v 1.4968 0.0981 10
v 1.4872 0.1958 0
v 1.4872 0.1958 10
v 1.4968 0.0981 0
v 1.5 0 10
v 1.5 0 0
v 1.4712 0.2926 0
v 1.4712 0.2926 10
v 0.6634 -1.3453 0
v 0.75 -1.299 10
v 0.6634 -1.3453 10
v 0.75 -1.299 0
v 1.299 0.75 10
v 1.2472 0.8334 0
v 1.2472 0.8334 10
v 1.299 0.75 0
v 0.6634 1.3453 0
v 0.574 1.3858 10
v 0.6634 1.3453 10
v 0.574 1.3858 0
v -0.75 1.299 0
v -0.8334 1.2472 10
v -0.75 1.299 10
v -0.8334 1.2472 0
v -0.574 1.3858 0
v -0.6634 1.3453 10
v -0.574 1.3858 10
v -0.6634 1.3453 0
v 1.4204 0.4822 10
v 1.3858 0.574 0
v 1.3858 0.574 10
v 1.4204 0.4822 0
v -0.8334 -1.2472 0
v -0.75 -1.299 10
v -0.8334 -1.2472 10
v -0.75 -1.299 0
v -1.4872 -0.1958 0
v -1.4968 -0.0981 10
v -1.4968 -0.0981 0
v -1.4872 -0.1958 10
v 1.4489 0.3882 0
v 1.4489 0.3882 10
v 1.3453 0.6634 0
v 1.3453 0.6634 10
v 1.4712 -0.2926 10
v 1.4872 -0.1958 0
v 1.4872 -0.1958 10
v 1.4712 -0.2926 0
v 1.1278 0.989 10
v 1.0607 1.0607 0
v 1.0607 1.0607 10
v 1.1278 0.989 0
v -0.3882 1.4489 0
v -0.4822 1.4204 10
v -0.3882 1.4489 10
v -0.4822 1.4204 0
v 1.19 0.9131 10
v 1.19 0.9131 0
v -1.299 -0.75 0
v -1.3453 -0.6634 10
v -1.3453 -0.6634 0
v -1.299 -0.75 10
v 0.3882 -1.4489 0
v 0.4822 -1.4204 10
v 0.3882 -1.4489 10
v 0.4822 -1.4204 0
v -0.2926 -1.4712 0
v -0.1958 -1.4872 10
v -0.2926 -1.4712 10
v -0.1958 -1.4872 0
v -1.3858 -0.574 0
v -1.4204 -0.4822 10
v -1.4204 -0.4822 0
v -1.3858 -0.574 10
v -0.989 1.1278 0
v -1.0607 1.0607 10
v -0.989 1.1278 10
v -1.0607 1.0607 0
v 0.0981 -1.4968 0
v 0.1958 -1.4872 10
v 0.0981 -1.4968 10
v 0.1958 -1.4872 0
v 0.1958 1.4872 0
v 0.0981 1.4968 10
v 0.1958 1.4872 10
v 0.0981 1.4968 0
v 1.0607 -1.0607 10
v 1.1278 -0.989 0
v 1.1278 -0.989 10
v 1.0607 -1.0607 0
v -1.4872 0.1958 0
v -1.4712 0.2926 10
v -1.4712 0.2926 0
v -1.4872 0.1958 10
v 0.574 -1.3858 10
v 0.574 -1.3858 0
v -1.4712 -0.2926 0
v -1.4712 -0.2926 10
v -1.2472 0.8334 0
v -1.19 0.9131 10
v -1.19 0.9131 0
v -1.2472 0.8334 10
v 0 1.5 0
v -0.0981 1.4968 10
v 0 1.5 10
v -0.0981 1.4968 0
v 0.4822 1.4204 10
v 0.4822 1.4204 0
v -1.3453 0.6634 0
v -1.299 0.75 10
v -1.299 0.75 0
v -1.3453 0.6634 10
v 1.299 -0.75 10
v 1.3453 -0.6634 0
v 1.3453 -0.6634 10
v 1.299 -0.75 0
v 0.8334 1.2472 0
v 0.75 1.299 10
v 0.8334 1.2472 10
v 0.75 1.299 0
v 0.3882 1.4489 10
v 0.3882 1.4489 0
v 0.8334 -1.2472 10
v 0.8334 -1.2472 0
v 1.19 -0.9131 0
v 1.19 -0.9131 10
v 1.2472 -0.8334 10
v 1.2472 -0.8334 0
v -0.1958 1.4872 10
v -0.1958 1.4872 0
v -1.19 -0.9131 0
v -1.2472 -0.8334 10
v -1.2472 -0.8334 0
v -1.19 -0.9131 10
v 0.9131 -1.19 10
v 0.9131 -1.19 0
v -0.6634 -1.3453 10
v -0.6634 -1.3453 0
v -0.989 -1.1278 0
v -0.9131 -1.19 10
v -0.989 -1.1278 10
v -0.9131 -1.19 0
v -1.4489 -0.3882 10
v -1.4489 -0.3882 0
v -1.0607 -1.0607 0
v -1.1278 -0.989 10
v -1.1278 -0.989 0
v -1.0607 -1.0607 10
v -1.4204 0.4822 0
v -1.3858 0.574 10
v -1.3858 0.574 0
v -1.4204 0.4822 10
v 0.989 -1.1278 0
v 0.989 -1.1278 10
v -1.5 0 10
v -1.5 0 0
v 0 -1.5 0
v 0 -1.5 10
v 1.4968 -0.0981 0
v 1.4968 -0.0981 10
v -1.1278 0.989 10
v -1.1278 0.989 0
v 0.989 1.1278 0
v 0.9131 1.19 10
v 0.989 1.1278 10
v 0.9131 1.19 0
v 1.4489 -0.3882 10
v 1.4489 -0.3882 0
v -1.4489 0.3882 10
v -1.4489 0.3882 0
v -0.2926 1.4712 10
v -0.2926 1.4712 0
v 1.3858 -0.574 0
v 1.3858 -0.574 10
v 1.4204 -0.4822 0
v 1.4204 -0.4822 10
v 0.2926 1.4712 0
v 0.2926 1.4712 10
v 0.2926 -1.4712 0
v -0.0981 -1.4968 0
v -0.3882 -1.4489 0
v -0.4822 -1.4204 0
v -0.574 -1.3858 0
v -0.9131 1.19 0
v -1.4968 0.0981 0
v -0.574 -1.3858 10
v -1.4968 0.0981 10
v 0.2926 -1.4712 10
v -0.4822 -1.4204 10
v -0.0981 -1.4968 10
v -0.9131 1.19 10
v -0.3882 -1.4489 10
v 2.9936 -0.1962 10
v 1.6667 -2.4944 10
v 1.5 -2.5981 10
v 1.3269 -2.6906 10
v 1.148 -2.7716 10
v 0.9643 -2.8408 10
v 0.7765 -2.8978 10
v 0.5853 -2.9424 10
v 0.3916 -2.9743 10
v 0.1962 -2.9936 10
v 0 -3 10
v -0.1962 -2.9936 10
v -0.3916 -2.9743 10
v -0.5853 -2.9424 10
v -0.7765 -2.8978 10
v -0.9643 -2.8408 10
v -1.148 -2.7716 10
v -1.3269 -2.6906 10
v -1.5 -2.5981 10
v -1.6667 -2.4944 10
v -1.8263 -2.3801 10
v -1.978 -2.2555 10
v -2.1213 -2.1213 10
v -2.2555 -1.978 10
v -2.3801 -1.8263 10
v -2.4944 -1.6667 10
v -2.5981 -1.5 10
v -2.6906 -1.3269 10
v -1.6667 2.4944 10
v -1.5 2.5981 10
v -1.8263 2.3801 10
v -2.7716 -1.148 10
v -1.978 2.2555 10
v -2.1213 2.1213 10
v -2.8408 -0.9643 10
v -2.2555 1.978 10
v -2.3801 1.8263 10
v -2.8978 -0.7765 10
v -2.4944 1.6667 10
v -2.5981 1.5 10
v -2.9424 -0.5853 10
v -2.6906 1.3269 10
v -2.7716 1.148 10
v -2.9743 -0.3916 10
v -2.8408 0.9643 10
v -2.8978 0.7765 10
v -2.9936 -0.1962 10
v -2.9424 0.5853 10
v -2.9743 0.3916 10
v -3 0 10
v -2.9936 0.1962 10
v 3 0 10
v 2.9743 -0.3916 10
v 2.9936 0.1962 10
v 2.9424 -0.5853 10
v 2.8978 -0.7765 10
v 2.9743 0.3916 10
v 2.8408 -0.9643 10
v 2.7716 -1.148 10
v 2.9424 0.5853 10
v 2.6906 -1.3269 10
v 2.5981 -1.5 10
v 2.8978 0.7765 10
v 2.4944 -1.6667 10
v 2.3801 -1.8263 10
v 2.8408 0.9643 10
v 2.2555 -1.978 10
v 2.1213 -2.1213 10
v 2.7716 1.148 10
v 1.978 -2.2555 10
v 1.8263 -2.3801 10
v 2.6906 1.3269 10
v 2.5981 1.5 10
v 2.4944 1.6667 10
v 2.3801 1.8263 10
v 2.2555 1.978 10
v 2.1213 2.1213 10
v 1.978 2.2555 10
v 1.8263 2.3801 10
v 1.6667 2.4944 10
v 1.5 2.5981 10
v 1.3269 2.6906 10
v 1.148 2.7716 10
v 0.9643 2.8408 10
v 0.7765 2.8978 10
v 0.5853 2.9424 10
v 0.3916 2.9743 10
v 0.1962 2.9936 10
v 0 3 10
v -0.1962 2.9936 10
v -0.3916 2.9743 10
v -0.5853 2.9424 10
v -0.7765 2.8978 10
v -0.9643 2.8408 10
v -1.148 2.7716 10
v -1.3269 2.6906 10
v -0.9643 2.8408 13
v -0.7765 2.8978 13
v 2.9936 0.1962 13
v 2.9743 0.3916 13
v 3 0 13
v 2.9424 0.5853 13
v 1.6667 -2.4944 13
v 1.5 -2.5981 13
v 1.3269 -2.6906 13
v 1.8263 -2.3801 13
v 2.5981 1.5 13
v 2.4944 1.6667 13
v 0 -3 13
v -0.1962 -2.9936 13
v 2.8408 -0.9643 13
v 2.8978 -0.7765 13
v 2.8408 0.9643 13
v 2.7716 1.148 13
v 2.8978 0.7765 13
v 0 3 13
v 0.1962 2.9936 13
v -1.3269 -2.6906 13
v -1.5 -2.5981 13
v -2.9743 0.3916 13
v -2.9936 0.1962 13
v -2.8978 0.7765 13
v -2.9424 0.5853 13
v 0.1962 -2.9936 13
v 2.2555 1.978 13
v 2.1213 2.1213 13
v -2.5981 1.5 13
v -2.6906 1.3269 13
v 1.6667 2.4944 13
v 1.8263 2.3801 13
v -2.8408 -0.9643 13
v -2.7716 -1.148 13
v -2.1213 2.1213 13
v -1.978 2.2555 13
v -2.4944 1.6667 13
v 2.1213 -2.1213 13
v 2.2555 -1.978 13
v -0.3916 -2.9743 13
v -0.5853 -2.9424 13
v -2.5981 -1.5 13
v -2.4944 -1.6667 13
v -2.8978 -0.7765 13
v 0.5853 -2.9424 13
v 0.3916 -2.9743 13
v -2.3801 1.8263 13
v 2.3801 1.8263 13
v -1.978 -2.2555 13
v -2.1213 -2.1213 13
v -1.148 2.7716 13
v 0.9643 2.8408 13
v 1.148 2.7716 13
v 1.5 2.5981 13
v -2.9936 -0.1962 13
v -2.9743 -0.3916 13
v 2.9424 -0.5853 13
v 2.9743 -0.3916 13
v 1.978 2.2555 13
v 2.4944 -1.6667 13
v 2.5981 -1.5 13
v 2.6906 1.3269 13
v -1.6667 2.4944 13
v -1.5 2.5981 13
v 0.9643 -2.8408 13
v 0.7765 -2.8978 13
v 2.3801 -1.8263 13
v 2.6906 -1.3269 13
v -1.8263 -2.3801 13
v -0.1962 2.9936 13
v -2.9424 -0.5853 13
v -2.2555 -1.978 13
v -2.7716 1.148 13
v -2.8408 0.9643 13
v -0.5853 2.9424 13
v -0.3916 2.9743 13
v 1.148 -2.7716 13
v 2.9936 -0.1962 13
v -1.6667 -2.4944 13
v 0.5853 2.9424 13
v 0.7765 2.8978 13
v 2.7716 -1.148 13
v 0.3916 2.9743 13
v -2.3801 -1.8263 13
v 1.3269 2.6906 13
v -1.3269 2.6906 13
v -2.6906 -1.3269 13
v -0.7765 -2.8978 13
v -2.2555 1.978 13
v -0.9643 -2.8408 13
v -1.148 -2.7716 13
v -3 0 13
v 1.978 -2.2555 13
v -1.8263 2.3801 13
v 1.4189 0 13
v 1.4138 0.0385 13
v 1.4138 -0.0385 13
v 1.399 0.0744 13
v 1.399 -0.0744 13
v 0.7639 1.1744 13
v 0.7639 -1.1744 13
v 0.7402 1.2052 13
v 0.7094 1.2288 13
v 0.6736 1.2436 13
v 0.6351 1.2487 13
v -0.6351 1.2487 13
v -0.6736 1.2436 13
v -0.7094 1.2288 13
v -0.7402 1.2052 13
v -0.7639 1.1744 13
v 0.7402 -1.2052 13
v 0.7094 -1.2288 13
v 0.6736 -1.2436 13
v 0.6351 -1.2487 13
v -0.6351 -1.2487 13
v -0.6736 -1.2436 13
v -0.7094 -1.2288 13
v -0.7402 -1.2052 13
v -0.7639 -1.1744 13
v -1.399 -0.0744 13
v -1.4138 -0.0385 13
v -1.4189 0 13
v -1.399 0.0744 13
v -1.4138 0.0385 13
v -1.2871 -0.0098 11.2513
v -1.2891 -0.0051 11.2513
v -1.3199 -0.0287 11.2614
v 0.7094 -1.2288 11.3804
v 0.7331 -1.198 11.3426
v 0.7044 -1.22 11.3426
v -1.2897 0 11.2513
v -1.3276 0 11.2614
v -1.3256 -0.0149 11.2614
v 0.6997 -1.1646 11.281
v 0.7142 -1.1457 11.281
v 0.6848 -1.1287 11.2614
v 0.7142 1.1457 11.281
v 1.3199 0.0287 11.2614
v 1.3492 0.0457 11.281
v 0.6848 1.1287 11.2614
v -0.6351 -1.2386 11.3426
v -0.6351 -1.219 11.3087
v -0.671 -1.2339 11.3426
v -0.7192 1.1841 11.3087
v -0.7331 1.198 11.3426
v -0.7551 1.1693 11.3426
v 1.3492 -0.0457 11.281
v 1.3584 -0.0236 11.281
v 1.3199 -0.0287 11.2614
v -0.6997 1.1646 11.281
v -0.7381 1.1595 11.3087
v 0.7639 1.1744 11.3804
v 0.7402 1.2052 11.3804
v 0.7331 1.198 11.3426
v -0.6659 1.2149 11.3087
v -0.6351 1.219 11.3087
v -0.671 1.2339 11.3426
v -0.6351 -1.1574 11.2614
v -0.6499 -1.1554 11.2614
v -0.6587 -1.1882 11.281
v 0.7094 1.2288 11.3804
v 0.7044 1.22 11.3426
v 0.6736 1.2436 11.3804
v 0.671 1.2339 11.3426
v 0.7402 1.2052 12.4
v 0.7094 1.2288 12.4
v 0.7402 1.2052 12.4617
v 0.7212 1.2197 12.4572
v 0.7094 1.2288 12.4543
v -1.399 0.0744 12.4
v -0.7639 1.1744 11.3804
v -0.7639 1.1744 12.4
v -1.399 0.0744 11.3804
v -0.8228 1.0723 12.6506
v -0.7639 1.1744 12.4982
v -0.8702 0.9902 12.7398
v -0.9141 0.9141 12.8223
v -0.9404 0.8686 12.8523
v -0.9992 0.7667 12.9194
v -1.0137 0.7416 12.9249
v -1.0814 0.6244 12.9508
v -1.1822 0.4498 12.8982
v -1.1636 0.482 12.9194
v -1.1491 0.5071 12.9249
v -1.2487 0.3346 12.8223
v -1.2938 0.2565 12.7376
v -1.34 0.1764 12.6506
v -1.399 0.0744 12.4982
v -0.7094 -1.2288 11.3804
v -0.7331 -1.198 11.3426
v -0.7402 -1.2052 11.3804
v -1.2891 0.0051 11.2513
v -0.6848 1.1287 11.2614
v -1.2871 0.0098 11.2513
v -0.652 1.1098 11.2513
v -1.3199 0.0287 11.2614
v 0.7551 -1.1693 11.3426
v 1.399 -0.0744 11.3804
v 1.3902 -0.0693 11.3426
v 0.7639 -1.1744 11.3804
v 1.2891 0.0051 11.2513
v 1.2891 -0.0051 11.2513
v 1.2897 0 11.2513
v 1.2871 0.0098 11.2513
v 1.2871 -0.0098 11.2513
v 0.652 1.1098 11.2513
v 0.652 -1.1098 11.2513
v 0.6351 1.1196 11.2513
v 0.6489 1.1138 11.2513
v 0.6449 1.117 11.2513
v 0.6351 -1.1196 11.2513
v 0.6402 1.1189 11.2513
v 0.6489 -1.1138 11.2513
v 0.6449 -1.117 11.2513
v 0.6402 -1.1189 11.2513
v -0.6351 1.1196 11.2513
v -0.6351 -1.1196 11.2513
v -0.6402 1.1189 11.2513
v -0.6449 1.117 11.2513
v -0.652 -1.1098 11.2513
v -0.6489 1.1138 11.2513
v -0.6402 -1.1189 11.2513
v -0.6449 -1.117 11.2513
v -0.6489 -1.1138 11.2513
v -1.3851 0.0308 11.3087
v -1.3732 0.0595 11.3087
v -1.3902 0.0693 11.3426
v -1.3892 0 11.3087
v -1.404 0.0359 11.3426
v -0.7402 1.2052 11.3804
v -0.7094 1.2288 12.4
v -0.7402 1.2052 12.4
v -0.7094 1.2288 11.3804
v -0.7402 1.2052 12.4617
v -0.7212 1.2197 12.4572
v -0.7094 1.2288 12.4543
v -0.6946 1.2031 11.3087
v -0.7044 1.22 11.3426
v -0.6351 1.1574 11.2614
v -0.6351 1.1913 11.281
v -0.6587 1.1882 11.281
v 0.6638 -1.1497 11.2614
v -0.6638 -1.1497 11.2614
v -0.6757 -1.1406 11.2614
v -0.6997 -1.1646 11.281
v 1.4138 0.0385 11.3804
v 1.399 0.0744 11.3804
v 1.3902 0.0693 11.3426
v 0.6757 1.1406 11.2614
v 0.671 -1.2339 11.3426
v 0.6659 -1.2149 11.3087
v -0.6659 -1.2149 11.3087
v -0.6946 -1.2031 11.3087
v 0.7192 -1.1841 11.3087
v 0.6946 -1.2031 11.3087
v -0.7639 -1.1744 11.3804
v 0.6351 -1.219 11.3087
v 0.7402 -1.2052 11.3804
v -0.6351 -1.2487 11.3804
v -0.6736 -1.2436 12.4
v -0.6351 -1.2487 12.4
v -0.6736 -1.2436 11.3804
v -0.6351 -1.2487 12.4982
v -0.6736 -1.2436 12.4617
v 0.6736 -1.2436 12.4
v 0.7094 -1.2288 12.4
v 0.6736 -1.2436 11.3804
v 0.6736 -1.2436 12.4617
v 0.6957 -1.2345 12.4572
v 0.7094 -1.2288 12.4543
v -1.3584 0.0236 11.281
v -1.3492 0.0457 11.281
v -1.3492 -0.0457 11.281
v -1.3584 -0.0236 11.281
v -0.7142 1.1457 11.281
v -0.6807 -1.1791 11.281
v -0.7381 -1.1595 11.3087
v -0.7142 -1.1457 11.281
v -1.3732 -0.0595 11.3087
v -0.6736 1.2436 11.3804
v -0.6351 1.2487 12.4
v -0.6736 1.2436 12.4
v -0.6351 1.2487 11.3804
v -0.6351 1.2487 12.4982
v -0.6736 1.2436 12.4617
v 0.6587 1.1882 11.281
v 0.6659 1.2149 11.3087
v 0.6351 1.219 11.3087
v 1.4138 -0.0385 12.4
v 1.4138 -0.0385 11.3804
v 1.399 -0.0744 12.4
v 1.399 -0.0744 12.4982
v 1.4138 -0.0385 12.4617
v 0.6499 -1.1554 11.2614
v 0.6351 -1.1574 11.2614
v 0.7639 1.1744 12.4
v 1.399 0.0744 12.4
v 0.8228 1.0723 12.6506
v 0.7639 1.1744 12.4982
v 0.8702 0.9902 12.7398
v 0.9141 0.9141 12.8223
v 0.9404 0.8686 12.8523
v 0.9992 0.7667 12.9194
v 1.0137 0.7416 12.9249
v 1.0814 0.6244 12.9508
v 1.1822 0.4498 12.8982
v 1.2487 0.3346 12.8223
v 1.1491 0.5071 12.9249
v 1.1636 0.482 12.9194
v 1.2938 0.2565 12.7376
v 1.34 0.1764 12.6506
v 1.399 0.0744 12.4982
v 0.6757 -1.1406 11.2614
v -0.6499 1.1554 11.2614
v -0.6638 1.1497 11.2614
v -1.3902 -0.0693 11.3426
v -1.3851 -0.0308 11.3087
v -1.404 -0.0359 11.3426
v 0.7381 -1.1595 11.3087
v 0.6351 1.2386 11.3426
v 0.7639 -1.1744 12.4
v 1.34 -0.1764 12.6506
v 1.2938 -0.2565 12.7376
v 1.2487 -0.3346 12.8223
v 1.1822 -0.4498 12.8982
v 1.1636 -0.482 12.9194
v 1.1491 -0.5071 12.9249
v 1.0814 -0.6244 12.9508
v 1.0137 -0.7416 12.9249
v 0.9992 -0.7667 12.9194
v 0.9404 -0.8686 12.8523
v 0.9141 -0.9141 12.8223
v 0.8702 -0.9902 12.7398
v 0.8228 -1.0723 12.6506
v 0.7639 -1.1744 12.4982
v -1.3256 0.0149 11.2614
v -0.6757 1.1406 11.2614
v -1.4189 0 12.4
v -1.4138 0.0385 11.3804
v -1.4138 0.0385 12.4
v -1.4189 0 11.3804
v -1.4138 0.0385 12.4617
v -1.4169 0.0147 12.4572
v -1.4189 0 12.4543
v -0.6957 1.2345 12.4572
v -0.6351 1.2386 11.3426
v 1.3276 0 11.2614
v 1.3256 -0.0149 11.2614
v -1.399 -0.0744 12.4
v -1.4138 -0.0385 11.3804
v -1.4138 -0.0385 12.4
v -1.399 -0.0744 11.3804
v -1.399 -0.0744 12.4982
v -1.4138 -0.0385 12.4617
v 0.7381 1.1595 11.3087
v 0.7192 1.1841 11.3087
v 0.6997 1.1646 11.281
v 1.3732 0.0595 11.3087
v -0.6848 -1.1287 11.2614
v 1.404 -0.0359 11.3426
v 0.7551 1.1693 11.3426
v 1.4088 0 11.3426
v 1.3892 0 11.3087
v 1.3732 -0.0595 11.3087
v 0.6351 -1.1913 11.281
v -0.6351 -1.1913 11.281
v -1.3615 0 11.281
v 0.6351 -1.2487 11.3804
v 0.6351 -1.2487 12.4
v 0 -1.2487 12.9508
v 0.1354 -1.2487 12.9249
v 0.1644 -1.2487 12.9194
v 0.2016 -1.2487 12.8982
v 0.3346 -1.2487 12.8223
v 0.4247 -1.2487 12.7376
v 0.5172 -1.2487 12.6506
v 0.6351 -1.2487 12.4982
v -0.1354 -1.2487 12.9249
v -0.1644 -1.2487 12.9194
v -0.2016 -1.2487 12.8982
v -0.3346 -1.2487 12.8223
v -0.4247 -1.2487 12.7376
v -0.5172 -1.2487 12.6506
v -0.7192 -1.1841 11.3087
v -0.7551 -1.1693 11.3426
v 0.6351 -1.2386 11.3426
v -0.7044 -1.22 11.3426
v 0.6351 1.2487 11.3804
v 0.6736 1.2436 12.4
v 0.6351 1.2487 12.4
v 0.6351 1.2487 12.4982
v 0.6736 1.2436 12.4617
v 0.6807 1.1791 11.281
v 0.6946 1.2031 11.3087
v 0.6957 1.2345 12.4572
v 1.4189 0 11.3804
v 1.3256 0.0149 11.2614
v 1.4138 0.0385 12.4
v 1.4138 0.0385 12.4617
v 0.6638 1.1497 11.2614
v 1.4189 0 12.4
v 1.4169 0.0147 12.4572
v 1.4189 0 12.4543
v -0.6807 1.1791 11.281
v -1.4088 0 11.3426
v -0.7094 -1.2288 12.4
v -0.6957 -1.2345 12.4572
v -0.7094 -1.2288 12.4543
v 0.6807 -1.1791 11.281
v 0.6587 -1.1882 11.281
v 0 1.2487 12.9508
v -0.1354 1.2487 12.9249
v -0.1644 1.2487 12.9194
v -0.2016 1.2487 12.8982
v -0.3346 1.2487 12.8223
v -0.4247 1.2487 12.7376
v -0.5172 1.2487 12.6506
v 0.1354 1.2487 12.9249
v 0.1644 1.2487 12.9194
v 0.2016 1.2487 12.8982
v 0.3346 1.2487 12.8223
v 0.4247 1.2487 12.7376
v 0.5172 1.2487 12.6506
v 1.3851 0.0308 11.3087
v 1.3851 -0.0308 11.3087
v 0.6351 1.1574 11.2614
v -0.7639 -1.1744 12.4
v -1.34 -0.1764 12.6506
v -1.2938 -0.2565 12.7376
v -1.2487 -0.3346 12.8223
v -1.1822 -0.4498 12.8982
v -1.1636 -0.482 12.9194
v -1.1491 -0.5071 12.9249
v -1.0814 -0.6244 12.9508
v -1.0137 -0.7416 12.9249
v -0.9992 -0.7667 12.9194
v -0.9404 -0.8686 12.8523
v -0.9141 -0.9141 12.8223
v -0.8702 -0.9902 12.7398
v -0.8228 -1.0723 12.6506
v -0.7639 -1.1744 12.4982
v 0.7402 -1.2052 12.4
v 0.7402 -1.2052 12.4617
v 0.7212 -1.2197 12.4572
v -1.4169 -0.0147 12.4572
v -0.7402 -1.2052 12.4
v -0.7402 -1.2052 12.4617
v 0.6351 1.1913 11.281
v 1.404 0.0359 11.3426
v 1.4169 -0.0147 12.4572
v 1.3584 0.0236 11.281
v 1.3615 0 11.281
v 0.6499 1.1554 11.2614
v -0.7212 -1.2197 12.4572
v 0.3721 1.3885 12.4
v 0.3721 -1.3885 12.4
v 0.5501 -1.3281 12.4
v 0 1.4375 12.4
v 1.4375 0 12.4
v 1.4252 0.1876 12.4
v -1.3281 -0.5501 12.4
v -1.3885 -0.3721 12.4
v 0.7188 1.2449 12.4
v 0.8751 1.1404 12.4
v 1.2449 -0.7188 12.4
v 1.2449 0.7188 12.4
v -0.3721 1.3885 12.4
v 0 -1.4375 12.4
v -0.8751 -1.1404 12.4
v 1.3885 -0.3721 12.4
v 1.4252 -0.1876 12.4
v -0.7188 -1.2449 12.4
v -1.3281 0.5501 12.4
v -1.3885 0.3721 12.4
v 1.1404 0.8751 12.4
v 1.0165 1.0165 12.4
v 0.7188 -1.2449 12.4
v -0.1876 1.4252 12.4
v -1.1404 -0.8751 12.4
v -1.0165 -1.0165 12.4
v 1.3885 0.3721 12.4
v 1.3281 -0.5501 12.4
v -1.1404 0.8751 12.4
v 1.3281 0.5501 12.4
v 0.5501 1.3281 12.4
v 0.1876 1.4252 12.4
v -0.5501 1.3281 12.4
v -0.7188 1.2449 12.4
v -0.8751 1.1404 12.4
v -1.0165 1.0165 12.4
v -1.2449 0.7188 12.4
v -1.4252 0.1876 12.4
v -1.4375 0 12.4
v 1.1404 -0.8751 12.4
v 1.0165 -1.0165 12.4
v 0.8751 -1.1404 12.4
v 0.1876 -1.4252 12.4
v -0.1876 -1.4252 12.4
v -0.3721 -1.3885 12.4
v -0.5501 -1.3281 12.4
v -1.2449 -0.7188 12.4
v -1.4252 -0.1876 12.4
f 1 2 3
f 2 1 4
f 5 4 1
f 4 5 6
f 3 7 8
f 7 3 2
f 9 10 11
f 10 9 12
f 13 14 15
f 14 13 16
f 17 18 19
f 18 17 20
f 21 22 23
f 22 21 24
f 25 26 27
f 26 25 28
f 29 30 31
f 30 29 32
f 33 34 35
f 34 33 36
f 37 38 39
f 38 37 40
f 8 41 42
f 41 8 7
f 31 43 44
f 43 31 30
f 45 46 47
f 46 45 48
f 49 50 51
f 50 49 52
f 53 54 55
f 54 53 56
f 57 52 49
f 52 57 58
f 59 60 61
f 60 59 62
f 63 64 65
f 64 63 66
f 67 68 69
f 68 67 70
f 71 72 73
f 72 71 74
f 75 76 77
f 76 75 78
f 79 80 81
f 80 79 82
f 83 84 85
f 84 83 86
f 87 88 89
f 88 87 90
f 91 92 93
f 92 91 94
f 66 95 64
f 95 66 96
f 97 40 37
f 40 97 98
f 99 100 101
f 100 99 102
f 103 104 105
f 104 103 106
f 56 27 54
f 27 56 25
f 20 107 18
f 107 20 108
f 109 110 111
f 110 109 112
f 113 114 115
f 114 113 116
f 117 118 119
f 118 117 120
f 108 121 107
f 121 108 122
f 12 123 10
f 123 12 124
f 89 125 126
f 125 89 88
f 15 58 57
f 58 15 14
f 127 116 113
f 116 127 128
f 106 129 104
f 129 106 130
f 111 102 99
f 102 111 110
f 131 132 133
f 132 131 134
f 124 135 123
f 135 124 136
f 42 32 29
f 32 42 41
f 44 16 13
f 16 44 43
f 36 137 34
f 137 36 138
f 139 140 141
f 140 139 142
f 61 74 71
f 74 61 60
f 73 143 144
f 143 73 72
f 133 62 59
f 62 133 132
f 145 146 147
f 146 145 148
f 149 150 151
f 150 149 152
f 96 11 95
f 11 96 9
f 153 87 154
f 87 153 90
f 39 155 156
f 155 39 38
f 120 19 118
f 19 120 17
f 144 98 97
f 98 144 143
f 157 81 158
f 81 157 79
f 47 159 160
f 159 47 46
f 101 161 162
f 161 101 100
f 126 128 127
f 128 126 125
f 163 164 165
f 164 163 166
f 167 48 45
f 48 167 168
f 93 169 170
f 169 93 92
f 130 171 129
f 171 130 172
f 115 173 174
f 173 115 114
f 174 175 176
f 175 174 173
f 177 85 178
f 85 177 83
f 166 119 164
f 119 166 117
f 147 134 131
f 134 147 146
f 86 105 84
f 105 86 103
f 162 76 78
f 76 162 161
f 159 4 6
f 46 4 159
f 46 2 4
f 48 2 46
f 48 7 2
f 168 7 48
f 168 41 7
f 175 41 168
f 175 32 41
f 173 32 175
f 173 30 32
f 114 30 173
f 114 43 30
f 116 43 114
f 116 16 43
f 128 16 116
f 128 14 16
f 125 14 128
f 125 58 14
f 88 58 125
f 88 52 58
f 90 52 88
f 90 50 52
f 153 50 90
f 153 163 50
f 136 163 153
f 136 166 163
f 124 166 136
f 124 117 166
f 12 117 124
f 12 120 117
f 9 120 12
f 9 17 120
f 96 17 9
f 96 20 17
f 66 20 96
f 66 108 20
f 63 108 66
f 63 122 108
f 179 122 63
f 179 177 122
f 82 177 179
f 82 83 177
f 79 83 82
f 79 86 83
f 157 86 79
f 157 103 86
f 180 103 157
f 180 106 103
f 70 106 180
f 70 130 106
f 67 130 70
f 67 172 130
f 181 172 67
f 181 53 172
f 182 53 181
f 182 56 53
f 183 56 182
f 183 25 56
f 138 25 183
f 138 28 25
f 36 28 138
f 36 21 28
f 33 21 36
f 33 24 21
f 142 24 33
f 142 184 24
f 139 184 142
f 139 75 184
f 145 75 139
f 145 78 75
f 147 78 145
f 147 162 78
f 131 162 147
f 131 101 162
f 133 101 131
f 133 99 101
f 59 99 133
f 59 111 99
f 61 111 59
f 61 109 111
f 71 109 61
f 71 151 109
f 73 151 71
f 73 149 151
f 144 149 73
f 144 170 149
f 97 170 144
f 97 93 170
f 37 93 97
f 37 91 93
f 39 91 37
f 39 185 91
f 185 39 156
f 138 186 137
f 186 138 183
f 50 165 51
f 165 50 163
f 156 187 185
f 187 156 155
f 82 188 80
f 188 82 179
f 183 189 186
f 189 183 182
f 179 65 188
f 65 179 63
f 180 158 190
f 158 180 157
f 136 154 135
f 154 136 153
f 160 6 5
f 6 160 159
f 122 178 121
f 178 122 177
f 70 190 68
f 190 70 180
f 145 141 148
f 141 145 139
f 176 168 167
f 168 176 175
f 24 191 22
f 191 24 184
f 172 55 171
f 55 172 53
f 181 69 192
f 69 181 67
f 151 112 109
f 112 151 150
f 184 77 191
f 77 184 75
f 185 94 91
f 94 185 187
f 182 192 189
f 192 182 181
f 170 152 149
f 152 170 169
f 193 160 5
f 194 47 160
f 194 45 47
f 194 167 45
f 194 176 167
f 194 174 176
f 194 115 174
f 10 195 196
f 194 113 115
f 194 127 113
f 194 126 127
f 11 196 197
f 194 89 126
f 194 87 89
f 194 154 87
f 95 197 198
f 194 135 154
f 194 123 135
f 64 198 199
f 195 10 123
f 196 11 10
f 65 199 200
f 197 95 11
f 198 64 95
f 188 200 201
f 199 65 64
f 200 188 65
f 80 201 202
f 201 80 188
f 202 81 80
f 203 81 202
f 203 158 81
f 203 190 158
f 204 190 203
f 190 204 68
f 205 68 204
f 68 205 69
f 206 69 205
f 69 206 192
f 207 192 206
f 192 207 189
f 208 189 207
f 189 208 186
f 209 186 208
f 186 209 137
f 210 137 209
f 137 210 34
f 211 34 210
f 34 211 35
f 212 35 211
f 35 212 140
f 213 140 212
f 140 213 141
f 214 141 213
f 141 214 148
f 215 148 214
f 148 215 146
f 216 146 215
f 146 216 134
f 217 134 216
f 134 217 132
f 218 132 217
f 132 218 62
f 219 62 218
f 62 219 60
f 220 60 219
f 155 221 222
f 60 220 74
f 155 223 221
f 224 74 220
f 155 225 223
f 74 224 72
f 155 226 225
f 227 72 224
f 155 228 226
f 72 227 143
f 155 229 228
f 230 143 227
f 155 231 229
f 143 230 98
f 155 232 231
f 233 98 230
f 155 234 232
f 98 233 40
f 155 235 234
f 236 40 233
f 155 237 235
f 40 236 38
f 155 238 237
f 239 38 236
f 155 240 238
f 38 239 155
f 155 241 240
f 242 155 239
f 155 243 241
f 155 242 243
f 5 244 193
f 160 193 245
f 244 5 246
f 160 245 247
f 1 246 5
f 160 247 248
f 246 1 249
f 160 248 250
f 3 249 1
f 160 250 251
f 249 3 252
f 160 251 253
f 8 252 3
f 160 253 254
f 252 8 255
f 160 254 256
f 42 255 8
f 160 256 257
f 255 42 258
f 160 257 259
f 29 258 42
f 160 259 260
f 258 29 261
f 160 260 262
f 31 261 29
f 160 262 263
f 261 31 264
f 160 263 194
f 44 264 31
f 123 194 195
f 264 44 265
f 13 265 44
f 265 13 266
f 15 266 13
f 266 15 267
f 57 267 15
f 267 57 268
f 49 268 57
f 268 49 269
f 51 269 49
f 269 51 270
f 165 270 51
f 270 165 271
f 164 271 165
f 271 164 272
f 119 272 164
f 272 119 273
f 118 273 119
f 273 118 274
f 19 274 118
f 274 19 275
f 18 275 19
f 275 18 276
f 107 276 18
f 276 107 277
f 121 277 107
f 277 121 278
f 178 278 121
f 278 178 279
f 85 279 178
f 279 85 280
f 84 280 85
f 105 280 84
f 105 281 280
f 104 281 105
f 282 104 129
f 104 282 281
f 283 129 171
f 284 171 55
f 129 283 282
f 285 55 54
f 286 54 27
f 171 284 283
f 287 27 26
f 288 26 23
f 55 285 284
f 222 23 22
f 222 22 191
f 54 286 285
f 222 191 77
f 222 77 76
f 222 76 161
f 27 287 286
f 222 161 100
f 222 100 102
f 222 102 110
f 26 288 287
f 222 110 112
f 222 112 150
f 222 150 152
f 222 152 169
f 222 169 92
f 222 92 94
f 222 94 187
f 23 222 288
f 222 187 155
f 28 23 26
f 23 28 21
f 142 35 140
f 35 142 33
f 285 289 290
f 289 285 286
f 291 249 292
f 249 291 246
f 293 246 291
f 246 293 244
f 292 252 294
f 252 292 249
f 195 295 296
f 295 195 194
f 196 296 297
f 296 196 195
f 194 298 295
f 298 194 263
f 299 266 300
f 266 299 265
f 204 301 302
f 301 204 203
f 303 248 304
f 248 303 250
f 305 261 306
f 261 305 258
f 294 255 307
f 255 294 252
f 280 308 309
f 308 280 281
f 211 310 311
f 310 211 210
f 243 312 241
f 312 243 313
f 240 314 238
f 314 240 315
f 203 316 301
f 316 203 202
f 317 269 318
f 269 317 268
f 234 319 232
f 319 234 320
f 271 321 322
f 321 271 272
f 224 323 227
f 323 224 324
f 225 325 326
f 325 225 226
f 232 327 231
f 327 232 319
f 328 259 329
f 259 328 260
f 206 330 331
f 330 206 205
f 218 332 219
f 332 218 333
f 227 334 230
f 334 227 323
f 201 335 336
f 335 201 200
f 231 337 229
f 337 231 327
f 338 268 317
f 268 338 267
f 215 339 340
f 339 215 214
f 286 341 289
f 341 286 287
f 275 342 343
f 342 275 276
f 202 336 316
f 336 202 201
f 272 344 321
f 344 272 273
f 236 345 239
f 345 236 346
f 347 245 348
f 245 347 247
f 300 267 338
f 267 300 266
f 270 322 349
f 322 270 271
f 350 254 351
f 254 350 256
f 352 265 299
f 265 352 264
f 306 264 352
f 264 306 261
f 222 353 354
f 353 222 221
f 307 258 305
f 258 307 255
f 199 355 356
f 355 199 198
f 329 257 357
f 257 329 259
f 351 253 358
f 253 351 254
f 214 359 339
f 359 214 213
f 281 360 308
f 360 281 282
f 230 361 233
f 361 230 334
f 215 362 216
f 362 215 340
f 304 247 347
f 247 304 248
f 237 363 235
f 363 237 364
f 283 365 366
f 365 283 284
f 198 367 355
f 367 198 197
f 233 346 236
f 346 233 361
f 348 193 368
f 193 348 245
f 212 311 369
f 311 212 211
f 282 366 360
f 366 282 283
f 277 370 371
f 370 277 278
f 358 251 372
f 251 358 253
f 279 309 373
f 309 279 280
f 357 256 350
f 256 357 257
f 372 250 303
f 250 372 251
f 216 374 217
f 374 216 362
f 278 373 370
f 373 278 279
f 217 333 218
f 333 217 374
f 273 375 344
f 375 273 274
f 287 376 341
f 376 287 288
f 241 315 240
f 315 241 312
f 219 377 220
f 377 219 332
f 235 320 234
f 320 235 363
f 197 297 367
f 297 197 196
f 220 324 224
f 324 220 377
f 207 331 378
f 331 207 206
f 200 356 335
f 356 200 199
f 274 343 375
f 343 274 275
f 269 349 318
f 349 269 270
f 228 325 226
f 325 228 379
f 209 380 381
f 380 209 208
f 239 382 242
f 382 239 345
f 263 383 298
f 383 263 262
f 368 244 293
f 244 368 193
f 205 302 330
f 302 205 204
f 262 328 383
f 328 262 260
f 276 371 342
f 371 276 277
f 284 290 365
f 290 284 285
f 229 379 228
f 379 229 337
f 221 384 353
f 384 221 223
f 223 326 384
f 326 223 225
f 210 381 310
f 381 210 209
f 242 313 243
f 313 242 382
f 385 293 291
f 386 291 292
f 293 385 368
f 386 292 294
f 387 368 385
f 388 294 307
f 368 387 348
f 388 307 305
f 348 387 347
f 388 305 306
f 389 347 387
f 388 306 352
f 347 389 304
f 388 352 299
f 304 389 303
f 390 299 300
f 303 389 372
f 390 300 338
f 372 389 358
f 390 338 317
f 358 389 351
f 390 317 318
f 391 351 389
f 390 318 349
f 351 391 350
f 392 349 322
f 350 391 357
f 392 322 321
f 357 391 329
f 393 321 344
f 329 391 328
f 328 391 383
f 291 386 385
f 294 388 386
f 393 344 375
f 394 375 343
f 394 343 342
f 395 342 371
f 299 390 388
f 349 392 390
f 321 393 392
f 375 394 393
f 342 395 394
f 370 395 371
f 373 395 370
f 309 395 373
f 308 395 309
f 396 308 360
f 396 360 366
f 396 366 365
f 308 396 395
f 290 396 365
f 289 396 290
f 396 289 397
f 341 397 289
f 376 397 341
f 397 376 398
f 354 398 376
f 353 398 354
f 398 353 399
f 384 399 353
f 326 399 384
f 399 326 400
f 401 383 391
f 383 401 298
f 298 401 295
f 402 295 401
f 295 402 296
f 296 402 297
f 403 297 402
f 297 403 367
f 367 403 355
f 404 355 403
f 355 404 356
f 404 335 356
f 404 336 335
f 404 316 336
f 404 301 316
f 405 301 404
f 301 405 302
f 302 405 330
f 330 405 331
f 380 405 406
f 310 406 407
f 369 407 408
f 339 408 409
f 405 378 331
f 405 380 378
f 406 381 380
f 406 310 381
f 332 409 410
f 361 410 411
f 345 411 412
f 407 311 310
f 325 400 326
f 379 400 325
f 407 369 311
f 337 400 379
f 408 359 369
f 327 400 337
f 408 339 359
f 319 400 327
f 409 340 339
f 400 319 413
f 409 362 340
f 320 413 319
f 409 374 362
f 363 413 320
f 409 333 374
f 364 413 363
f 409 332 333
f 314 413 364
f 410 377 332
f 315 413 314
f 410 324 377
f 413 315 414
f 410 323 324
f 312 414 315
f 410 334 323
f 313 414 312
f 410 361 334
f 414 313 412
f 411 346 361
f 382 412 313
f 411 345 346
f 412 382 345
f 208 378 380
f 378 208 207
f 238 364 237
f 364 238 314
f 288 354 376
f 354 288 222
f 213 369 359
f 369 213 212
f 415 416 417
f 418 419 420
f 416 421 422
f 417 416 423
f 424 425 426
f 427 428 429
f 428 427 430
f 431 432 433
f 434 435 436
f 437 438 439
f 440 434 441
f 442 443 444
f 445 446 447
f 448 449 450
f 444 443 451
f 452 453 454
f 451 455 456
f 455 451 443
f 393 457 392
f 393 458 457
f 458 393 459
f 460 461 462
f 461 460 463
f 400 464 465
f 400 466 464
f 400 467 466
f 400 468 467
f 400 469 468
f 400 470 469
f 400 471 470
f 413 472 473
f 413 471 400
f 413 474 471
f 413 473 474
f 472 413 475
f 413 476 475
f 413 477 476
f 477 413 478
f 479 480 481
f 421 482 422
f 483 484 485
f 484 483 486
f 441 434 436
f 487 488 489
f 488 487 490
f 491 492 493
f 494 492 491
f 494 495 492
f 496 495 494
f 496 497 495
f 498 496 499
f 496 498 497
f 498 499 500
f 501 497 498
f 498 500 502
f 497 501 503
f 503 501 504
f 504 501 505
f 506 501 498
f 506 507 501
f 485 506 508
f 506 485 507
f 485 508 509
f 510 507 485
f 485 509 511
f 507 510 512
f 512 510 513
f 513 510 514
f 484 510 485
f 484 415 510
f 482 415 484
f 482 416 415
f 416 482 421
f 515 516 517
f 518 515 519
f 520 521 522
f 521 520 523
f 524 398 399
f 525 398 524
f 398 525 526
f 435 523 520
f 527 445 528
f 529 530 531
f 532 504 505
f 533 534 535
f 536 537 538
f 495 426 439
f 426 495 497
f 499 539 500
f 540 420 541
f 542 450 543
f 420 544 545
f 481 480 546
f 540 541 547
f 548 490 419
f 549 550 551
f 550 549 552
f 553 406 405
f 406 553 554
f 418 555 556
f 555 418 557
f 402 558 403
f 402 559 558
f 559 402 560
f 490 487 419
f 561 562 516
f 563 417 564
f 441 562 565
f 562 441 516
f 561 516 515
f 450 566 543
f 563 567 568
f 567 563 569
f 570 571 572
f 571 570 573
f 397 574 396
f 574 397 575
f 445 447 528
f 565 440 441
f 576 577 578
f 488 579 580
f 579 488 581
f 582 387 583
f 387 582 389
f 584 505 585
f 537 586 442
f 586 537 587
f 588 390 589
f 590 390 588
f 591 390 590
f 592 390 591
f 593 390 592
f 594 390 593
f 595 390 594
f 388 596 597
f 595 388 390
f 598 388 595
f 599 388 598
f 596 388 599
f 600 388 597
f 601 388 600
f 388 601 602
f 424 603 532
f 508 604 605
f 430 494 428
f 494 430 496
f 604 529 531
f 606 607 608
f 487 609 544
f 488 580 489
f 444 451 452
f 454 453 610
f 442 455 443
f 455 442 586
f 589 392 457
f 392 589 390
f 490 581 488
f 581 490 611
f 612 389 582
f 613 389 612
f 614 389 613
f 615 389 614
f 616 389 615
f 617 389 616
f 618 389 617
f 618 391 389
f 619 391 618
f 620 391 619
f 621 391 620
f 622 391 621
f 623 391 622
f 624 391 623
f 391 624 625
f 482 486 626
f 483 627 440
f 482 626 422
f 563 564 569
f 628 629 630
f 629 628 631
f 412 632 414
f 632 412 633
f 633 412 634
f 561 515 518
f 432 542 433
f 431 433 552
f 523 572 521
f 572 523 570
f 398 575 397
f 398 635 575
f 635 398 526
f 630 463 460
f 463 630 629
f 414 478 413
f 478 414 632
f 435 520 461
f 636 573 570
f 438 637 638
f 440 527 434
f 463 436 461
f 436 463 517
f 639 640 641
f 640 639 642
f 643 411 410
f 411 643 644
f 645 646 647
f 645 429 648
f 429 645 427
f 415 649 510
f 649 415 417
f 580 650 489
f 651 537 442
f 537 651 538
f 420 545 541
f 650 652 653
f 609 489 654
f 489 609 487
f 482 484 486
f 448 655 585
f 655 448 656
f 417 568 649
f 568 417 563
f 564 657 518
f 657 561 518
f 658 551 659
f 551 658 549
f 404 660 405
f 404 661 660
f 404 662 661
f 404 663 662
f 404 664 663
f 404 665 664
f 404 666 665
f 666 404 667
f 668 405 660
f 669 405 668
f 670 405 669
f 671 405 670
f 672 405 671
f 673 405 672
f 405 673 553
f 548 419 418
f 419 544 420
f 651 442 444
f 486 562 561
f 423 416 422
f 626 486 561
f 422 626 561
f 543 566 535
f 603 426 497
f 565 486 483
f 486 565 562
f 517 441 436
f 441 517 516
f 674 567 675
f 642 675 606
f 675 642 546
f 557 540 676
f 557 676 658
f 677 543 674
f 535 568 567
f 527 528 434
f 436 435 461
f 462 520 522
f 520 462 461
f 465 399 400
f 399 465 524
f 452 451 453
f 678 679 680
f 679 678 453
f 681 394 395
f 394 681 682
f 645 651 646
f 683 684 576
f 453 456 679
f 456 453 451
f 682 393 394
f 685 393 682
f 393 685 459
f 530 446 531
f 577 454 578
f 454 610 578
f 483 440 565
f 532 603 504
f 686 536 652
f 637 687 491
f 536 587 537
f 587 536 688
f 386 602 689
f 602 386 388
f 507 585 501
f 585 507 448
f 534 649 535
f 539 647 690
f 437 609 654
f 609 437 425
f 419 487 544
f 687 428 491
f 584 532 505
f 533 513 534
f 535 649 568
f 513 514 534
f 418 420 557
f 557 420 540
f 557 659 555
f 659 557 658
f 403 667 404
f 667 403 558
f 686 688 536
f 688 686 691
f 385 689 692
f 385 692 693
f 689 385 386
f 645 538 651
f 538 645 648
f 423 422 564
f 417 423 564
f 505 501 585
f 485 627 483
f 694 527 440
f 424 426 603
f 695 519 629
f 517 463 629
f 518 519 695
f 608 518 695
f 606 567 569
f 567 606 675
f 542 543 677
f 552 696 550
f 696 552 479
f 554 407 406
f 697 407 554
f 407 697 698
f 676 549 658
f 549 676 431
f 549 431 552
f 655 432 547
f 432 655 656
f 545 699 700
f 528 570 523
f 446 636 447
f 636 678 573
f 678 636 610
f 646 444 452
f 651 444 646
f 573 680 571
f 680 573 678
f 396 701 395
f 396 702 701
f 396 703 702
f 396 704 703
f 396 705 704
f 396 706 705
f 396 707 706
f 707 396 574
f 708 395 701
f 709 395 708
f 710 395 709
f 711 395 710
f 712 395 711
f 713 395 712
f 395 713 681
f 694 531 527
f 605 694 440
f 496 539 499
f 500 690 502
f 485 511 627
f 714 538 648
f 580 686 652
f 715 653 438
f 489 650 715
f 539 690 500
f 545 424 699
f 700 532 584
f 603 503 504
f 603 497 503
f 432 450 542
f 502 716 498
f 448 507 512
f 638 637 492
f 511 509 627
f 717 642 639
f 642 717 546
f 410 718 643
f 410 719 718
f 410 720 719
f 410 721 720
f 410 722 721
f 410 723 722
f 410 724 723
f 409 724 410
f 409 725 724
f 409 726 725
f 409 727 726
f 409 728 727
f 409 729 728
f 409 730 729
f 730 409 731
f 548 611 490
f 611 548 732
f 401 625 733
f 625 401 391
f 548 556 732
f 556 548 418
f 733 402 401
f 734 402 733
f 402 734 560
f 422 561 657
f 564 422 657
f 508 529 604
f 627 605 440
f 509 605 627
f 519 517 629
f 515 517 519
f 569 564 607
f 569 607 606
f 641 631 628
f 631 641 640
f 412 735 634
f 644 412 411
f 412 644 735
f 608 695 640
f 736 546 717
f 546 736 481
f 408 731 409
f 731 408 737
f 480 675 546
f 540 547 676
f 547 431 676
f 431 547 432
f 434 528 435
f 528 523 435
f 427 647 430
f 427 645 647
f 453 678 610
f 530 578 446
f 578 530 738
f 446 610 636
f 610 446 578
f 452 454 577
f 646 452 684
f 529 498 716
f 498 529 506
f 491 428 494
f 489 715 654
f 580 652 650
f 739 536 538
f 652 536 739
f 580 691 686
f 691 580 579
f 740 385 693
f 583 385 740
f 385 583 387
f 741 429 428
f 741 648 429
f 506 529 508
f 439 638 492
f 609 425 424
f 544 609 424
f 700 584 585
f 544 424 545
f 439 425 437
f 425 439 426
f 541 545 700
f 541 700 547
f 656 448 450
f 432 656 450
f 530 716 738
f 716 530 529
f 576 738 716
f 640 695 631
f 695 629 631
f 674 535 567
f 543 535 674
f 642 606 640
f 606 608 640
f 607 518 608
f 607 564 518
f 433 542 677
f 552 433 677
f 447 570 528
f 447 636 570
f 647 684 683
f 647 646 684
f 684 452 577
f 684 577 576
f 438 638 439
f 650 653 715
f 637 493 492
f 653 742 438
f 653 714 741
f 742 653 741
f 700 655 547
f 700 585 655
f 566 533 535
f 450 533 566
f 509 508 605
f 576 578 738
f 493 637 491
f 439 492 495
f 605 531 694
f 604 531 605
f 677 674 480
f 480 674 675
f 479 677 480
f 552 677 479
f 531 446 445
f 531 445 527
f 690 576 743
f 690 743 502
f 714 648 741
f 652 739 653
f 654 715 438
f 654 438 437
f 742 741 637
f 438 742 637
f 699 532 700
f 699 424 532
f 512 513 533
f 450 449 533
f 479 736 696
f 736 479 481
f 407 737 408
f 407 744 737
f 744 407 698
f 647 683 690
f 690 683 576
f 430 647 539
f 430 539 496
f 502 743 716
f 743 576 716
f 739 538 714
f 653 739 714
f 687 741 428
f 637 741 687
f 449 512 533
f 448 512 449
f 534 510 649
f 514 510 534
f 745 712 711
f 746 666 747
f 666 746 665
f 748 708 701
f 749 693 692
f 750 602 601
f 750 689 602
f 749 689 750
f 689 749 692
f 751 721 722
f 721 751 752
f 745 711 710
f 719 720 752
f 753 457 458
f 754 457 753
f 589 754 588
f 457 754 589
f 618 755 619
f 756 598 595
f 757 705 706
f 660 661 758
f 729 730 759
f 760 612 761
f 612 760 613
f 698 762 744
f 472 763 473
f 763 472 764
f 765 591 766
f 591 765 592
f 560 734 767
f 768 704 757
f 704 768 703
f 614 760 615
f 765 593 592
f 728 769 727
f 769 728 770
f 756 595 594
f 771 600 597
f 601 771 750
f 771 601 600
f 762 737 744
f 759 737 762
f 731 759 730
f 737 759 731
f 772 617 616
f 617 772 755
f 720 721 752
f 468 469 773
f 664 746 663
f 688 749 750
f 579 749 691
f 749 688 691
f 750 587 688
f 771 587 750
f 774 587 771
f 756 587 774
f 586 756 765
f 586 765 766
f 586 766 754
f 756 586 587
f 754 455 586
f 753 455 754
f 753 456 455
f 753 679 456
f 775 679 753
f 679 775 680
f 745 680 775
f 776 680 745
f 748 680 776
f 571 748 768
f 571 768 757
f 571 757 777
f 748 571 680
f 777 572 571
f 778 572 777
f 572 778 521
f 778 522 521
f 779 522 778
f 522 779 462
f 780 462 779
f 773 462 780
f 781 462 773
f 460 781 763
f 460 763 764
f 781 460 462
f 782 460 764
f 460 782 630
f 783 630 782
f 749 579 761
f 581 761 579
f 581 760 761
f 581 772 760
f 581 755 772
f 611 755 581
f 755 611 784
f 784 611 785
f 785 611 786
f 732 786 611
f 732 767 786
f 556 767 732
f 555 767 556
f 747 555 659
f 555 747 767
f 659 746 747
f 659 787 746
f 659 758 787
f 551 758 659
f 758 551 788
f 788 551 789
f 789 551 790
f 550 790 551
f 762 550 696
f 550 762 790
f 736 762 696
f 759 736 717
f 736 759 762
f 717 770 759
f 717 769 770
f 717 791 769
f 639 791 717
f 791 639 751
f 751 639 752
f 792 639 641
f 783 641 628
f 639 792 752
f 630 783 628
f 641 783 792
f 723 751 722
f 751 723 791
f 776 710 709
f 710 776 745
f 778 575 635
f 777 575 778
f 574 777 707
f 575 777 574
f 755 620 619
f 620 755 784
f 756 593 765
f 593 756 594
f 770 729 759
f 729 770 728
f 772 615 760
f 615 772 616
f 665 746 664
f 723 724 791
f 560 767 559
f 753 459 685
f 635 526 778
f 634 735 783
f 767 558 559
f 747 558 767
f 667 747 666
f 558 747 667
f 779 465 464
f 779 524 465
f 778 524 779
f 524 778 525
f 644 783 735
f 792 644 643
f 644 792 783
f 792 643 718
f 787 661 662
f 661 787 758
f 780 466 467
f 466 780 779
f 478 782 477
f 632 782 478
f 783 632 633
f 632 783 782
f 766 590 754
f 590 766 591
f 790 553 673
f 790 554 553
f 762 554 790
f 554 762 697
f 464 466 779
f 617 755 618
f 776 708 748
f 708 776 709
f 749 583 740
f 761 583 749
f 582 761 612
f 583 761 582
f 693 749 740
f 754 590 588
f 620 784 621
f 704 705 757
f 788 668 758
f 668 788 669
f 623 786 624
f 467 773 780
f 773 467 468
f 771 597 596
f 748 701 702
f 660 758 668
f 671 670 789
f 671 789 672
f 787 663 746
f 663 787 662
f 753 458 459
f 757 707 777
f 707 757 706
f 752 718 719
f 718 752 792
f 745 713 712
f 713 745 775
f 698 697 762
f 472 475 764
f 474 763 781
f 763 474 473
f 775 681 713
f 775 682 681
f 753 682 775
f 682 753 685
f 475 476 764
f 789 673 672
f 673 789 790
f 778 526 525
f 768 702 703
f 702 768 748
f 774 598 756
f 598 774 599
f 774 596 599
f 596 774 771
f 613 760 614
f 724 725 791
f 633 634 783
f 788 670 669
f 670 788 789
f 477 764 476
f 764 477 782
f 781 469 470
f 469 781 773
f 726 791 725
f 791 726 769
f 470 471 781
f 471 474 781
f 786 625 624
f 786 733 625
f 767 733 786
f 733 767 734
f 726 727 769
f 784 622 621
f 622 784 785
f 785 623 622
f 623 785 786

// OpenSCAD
$fn = 96;

// Socket Head Cap Screw (approx. ISO 4762)
// Parameters (mm)
d_shank = 3.0;
L = 10.0;

d_head = 6.0;
h_head = 3.0;

hex_af = 2.5;          // typical for M3
hex_depth = 1.6;       // typical for M3
hex_corner_r = 0.15;   // slight rounding

// Small edge chamfers
head_top_chamfer = 0.35;
head_bottom_chamfer = 0.25;
shank_tip_chamfer = 0.25;

module hex_prism(af, h) {
    // Regular hex with across-flats = af
    r = af / sqrt(3); // circumradius
    cylinder(h=h, r=r, $fn=6);
}

module socket_head_cap_screw() {
    union() {
        // Shank
        translate([0,0,0])
        cylinder(h=L, d=d_shank);

        // Shank tip chamfer
        translate([0,0,0])
        cylinder(h=shank_tip_chamfer, d1=d_shank*0.6, d2=d_shank);

        // Head (with slight bottom chamfer)
        translate([0,0,L])
        cylinder(h=h_head, d=d_head);

        // Bottom chamfer on head
        translate([0,0,L])
        cylinder(h=head_bottom_chamfer, d1=d_head*0.92, d2=d_head);

        // Top chamfer on head
        translate([0,0,L + h_head - head_top_chamfer])
        cylinder(h=head_top_chamfer, d1=d_head, d2=d_head*0.92);
    }
}

module screw_with_socket() {
    difference() {
        socket_head_cap_screw();

        // Hex socket cut
        translate([0,0, L + h_head - hex_depth])
        minkowski() {
            hex_prism(hex_af - 2*hex_corner_r, hex_depth + 0.02);
            sphere(r=hex_corner_r, $fn=24);
        }

        // Slight lead-in at socket opening
        translate([0,0, L + h_head - 0.6])
        cylinder(h=0.6 + 0.02, d1=hex_af*1.15, d2=hex_af*0.98, $fn=48);
    }
}

screw_with_socket();
